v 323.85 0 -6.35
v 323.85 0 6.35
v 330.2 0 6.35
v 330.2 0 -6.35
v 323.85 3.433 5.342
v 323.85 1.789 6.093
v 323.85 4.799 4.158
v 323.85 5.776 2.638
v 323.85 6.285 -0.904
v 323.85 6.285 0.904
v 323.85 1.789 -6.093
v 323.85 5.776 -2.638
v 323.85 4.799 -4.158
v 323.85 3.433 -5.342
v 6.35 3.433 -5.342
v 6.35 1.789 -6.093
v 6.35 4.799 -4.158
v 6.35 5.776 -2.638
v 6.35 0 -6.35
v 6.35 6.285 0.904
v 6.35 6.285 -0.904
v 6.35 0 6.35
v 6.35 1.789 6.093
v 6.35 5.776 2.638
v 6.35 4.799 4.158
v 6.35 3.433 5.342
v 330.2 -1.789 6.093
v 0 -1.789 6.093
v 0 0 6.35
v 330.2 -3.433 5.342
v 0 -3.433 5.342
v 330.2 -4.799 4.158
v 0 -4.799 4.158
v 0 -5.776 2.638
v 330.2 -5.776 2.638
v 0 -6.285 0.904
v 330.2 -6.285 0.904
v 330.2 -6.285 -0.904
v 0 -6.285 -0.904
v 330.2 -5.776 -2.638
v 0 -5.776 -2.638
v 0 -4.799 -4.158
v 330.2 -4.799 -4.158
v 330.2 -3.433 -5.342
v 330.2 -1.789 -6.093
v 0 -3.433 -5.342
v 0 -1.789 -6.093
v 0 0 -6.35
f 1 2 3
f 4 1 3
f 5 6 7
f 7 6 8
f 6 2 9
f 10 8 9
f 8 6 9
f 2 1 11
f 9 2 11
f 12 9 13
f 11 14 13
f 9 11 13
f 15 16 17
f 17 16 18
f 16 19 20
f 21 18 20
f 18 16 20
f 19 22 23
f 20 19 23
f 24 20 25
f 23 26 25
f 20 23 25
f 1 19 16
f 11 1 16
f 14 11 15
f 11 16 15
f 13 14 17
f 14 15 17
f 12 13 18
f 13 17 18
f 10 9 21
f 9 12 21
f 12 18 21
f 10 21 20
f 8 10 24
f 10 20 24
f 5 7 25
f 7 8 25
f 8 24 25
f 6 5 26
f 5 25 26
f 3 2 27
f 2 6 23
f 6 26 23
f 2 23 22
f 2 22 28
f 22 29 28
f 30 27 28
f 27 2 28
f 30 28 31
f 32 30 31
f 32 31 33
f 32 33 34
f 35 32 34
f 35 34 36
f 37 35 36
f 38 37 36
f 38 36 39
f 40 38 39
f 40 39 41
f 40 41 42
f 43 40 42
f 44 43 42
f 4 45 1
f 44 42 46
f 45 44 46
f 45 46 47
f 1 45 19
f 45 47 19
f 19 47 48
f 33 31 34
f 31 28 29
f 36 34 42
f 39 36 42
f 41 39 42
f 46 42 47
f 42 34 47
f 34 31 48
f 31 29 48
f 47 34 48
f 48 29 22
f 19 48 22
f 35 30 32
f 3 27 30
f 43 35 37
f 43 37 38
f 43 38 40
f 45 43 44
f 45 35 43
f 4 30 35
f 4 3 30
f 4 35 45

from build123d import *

# Parameters (mm, degrees)
SKETCH1_R               = 6.35
BOSS_EXTRUDE1_DEPTH     = 330.2
SKETCH2_W               = 6.35
SKETCH2_H               = 6.35
CUT_EXTRUDE1_DEPTH      = 7.35
CUT_EXTRUDE1_DEPTH_BACK = 7.35


with BuildPart() as part:
    # Sketch1 → Boss-Extrude1 (new body)
    with BuildSketch(Plane(origin=(0, 0, 0), x_dir=(0, 0, -1), z_dir=(1, 0, 0))):
        Circle(SKETCH1_R)
    extrude(amount=BOSS_EXTRUDE1_DEPTH)

    # Sketch2 → Cut-Extrude1 (cut, two sides)
    with BuildSketch(Plane.XY) as cut_extrude1_sk:
        with Locations((3.175, 3.175)):
            Rectangle(SKETCH2_W, SKETCH2_H)
        with Locations((327.025, 3.175)):
            Rectangle(SKETCH2_W, SKETCH2_H)
    extrude(amount=CUT_EXTRUDE1_DEPTH, mode=Mode.SUBTRACT)
    extrude(cut_extrude1_sk.sketch, amount=-CUT_EXTRUDE1_DEPTH_BACK, mode=Mode.SUBTRACT)


solid = part.part
